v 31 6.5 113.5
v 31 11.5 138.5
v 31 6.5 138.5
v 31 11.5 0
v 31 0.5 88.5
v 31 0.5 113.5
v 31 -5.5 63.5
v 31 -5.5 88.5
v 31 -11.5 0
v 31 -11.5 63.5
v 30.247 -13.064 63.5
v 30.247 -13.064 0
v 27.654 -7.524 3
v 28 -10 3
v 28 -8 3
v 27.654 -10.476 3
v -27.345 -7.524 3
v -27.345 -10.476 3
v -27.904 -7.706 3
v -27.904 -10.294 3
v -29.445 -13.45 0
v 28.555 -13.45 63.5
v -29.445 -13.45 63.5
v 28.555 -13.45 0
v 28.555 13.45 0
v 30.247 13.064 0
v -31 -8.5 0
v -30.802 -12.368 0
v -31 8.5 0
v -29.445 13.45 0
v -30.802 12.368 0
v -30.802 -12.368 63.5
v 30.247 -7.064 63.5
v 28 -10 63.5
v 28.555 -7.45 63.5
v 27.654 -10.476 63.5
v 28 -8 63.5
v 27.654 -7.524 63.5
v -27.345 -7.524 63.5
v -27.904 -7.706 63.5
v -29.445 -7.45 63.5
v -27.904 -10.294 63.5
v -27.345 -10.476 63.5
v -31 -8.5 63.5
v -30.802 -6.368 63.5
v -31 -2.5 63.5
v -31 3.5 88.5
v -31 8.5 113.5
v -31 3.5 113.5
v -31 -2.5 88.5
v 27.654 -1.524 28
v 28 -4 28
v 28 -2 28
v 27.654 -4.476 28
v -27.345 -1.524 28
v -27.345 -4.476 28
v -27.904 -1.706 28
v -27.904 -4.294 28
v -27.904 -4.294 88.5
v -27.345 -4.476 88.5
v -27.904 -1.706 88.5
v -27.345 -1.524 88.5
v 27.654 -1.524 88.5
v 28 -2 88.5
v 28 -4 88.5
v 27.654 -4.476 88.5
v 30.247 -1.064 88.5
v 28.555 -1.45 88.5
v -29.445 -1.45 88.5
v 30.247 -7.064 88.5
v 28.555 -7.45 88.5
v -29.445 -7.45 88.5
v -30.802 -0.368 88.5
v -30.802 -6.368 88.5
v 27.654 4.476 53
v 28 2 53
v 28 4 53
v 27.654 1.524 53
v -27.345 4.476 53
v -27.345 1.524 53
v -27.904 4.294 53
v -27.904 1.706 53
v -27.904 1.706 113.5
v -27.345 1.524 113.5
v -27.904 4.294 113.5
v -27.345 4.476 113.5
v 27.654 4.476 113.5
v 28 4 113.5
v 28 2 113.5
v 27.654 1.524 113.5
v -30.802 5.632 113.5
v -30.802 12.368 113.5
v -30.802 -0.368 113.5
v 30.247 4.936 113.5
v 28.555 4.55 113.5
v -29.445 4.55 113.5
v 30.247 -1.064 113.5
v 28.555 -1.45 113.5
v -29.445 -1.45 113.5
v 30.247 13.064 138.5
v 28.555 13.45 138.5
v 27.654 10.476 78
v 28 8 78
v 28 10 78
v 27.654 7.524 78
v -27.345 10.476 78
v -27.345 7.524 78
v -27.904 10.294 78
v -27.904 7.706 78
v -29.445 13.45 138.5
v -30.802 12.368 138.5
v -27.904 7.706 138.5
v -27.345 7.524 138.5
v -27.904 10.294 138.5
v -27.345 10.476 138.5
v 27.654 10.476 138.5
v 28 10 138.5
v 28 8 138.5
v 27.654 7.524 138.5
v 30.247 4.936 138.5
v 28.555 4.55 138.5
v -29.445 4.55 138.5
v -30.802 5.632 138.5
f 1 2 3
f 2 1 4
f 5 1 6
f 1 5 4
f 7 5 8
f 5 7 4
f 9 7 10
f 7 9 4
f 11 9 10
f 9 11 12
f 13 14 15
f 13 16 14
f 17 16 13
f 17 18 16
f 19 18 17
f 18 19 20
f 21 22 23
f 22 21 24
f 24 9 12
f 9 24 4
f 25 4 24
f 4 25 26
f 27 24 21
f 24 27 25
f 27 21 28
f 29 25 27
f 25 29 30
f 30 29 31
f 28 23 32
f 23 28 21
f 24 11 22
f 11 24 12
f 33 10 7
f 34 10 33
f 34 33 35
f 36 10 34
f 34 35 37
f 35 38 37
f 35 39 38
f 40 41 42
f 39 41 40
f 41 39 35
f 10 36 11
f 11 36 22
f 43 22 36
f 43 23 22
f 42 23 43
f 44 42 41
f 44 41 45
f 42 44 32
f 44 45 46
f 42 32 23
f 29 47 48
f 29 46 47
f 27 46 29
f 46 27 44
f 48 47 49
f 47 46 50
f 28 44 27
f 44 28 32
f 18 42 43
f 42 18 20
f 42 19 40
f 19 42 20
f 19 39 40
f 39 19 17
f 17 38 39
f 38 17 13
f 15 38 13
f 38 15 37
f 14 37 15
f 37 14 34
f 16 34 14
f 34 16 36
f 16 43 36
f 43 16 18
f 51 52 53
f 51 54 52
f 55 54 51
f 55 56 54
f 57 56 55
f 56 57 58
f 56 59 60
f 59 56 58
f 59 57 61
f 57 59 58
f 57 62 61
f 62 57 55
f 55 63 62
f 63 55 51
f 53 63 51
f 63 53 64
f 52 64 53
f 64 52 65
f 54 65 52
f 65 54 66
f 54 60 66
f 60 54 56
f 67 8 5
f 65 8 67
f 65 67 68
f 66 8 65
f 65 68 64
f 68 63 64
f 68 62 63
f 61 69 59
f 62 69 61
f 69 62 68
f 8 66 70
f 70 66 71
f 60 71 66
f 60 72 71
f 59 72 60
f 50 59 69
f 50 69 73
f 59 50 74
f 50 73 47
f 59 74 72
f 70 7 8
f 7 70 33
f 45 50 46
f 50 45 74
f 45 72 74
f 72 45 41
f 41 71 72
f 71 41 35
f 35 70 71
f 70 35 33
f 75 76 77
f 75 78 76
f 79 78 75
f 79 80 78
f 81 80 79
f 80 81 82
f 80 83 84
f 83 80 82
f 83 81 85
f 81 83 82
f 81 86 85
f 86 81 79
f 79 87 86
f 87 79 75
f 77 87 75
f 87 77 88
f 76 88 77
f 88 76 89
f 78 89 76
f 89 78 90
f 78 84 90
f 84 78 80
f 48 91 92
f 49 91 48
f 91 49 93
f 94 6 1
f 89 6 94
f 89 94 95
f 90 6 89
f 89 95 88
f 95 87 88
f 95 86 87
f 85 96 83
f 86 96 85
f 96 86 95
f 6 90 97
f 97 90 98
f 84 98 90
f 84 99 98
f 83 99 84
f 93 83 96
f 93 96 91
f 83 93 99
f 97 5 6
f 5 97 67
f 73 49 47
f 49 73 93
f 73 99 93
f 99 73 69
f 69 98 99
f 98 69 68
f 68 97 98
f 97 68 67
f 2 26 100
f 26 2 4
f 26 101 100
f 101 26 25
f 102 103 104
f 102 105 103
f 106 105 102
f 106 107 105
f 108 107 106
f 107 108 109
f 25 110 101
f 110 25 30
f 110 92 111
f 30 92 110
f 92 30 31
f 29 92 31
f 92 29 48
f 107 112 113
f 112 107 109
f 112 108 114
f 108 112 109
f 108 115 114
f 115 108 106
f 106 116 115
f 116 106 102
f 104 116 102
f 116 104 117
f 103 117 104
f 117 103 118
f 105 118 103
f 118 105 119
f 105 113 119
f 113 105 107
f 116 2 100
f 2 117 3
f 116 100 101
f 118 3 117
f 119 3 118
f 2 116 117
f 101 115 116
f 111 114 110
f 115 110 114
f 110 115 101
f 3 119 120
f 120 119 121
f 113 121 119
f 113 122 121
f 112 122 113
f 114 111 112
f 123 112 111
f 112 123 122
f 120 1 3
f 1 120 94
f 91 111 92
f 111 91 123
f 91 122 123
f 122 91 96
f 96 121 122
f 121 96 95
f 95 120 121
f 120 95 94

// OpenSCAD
module hulled_card(size, thickness, front_square=false, rear_square=false) {
    // draw a card including a square or circle hull
    hull() {
        square([size[1], size[2]]); // card
        // place a circle or square in each corner
        color("blue")
        for (corner_i = [0, 1]) {
            for (corner_j = [0, 1]) {
                translate([corner_i*size[1] + (corner_i*2-1)*thickness/2,
                           corner_j*size[2] + (corner_j*2-1)*thickness/2]) {
                    // square or circle, depending on front or rear
                    if (   (corner_j == 0 && front_square)
                        || (corner_j == 1 && rear_square)) {
                        square(thickness, center=true);
                    } else {
                        circle(thickness/2);
                    }
                }
            }
        }
    }
}

module hulled_card_border(size, spacing, thickness, front_square=false, rear_square=false) {
    // draw only the border of a card (of thickness)
    difference() {
        hulled_card(size, spacing+thickness, front_square=front_square, rear_square=rear_square);
        hulled_card(size, spacing);
    }
}

module cardholder_part(size, spacing, thickness, visibility, raise, delta, front, rear) {
    // there are three sections:
    // filled
    linear_extrude(raise+thickness) {
        hulled_card(size, spacing+thickness);
    }
    // with card hole and front square, up to the height of the previous card holder
    if (!front) {
        linear_extrude(raise-delta+thickness+spacing+size[0] * (1-visibility)) {
            hulled_card_border(size, spacing, thickness, front_square=!front, rear_square=!rear);
        };
    }
    // and the rest, up to visibility
    linear_extrude(raise+thickness + spacing + size[0] * (1-visibility)) {
        hulled_card_border(size, spacing, thickness, rear_square=!rear);
    };
}

module cardholder(size=[85, 54, 1], thickness=3, spacing=1, cards=4, delta=25, visibility=0.3) {
    // hard conditions in the assignment
    if (len(size) > 1
        && size[0] > 0 && size[1] > 0
        && cards > 0) {
        // make sure size is 3-tuple
        size_ = [size[0], size[1], len(size) < 3 ? 0 : size[2]];
        // clamp the visibility, thickness, and spacnig
        visibility_ = visibility < 0 ? 0 : visibility > 1 ? 1 : visibility;
        thickness_  = thickness  < 0 ? 0 : thickness;
        spacing_    = spacing    < 0 ? 0 : spacing;
        // use an absolute delta
        delta_ = abs(delta);
        // prepare for rotation if delta is negative
        rot = delta < 0;
        // calculate the width and length so the structure can be centered.
        holder_width = thickness_*2 + spacing_*2 + size_[1];
        holder_length = (thickness_ + spacing_*2 + size_[2]) * cards + thickness_;
        // I only used this to verify
        holder_height = (delta_*(cards-1))  + (thickness_ + spacing_ + size_[0] * (1-visibility_));
        // rotate if delta was negative
        rotate([0, 0, rot ? 180 : 0])
        // center the card holder as requested
        translate([-holder_width/2, -holder_length/2, 0]) {
            // for each card
            for (i = [0 : cards-1]) {
                // render the card holder part, including the filled part from
                // the ground, properly shifted so that it overlays the previous
                // card holder part's rear thickness.
                translate([thickness_+spacing_, thickness_+spacing_+i*(thickness_+spacing_*2+size_[2]), 0])
                    cardholder_part(size_, spacing_, thickness_, visibility_, delta_*i,
                    delta_,
                    front = i == 0,
                    rear  = i == cards-1);
            }
        }
   }
}

cardholder();
